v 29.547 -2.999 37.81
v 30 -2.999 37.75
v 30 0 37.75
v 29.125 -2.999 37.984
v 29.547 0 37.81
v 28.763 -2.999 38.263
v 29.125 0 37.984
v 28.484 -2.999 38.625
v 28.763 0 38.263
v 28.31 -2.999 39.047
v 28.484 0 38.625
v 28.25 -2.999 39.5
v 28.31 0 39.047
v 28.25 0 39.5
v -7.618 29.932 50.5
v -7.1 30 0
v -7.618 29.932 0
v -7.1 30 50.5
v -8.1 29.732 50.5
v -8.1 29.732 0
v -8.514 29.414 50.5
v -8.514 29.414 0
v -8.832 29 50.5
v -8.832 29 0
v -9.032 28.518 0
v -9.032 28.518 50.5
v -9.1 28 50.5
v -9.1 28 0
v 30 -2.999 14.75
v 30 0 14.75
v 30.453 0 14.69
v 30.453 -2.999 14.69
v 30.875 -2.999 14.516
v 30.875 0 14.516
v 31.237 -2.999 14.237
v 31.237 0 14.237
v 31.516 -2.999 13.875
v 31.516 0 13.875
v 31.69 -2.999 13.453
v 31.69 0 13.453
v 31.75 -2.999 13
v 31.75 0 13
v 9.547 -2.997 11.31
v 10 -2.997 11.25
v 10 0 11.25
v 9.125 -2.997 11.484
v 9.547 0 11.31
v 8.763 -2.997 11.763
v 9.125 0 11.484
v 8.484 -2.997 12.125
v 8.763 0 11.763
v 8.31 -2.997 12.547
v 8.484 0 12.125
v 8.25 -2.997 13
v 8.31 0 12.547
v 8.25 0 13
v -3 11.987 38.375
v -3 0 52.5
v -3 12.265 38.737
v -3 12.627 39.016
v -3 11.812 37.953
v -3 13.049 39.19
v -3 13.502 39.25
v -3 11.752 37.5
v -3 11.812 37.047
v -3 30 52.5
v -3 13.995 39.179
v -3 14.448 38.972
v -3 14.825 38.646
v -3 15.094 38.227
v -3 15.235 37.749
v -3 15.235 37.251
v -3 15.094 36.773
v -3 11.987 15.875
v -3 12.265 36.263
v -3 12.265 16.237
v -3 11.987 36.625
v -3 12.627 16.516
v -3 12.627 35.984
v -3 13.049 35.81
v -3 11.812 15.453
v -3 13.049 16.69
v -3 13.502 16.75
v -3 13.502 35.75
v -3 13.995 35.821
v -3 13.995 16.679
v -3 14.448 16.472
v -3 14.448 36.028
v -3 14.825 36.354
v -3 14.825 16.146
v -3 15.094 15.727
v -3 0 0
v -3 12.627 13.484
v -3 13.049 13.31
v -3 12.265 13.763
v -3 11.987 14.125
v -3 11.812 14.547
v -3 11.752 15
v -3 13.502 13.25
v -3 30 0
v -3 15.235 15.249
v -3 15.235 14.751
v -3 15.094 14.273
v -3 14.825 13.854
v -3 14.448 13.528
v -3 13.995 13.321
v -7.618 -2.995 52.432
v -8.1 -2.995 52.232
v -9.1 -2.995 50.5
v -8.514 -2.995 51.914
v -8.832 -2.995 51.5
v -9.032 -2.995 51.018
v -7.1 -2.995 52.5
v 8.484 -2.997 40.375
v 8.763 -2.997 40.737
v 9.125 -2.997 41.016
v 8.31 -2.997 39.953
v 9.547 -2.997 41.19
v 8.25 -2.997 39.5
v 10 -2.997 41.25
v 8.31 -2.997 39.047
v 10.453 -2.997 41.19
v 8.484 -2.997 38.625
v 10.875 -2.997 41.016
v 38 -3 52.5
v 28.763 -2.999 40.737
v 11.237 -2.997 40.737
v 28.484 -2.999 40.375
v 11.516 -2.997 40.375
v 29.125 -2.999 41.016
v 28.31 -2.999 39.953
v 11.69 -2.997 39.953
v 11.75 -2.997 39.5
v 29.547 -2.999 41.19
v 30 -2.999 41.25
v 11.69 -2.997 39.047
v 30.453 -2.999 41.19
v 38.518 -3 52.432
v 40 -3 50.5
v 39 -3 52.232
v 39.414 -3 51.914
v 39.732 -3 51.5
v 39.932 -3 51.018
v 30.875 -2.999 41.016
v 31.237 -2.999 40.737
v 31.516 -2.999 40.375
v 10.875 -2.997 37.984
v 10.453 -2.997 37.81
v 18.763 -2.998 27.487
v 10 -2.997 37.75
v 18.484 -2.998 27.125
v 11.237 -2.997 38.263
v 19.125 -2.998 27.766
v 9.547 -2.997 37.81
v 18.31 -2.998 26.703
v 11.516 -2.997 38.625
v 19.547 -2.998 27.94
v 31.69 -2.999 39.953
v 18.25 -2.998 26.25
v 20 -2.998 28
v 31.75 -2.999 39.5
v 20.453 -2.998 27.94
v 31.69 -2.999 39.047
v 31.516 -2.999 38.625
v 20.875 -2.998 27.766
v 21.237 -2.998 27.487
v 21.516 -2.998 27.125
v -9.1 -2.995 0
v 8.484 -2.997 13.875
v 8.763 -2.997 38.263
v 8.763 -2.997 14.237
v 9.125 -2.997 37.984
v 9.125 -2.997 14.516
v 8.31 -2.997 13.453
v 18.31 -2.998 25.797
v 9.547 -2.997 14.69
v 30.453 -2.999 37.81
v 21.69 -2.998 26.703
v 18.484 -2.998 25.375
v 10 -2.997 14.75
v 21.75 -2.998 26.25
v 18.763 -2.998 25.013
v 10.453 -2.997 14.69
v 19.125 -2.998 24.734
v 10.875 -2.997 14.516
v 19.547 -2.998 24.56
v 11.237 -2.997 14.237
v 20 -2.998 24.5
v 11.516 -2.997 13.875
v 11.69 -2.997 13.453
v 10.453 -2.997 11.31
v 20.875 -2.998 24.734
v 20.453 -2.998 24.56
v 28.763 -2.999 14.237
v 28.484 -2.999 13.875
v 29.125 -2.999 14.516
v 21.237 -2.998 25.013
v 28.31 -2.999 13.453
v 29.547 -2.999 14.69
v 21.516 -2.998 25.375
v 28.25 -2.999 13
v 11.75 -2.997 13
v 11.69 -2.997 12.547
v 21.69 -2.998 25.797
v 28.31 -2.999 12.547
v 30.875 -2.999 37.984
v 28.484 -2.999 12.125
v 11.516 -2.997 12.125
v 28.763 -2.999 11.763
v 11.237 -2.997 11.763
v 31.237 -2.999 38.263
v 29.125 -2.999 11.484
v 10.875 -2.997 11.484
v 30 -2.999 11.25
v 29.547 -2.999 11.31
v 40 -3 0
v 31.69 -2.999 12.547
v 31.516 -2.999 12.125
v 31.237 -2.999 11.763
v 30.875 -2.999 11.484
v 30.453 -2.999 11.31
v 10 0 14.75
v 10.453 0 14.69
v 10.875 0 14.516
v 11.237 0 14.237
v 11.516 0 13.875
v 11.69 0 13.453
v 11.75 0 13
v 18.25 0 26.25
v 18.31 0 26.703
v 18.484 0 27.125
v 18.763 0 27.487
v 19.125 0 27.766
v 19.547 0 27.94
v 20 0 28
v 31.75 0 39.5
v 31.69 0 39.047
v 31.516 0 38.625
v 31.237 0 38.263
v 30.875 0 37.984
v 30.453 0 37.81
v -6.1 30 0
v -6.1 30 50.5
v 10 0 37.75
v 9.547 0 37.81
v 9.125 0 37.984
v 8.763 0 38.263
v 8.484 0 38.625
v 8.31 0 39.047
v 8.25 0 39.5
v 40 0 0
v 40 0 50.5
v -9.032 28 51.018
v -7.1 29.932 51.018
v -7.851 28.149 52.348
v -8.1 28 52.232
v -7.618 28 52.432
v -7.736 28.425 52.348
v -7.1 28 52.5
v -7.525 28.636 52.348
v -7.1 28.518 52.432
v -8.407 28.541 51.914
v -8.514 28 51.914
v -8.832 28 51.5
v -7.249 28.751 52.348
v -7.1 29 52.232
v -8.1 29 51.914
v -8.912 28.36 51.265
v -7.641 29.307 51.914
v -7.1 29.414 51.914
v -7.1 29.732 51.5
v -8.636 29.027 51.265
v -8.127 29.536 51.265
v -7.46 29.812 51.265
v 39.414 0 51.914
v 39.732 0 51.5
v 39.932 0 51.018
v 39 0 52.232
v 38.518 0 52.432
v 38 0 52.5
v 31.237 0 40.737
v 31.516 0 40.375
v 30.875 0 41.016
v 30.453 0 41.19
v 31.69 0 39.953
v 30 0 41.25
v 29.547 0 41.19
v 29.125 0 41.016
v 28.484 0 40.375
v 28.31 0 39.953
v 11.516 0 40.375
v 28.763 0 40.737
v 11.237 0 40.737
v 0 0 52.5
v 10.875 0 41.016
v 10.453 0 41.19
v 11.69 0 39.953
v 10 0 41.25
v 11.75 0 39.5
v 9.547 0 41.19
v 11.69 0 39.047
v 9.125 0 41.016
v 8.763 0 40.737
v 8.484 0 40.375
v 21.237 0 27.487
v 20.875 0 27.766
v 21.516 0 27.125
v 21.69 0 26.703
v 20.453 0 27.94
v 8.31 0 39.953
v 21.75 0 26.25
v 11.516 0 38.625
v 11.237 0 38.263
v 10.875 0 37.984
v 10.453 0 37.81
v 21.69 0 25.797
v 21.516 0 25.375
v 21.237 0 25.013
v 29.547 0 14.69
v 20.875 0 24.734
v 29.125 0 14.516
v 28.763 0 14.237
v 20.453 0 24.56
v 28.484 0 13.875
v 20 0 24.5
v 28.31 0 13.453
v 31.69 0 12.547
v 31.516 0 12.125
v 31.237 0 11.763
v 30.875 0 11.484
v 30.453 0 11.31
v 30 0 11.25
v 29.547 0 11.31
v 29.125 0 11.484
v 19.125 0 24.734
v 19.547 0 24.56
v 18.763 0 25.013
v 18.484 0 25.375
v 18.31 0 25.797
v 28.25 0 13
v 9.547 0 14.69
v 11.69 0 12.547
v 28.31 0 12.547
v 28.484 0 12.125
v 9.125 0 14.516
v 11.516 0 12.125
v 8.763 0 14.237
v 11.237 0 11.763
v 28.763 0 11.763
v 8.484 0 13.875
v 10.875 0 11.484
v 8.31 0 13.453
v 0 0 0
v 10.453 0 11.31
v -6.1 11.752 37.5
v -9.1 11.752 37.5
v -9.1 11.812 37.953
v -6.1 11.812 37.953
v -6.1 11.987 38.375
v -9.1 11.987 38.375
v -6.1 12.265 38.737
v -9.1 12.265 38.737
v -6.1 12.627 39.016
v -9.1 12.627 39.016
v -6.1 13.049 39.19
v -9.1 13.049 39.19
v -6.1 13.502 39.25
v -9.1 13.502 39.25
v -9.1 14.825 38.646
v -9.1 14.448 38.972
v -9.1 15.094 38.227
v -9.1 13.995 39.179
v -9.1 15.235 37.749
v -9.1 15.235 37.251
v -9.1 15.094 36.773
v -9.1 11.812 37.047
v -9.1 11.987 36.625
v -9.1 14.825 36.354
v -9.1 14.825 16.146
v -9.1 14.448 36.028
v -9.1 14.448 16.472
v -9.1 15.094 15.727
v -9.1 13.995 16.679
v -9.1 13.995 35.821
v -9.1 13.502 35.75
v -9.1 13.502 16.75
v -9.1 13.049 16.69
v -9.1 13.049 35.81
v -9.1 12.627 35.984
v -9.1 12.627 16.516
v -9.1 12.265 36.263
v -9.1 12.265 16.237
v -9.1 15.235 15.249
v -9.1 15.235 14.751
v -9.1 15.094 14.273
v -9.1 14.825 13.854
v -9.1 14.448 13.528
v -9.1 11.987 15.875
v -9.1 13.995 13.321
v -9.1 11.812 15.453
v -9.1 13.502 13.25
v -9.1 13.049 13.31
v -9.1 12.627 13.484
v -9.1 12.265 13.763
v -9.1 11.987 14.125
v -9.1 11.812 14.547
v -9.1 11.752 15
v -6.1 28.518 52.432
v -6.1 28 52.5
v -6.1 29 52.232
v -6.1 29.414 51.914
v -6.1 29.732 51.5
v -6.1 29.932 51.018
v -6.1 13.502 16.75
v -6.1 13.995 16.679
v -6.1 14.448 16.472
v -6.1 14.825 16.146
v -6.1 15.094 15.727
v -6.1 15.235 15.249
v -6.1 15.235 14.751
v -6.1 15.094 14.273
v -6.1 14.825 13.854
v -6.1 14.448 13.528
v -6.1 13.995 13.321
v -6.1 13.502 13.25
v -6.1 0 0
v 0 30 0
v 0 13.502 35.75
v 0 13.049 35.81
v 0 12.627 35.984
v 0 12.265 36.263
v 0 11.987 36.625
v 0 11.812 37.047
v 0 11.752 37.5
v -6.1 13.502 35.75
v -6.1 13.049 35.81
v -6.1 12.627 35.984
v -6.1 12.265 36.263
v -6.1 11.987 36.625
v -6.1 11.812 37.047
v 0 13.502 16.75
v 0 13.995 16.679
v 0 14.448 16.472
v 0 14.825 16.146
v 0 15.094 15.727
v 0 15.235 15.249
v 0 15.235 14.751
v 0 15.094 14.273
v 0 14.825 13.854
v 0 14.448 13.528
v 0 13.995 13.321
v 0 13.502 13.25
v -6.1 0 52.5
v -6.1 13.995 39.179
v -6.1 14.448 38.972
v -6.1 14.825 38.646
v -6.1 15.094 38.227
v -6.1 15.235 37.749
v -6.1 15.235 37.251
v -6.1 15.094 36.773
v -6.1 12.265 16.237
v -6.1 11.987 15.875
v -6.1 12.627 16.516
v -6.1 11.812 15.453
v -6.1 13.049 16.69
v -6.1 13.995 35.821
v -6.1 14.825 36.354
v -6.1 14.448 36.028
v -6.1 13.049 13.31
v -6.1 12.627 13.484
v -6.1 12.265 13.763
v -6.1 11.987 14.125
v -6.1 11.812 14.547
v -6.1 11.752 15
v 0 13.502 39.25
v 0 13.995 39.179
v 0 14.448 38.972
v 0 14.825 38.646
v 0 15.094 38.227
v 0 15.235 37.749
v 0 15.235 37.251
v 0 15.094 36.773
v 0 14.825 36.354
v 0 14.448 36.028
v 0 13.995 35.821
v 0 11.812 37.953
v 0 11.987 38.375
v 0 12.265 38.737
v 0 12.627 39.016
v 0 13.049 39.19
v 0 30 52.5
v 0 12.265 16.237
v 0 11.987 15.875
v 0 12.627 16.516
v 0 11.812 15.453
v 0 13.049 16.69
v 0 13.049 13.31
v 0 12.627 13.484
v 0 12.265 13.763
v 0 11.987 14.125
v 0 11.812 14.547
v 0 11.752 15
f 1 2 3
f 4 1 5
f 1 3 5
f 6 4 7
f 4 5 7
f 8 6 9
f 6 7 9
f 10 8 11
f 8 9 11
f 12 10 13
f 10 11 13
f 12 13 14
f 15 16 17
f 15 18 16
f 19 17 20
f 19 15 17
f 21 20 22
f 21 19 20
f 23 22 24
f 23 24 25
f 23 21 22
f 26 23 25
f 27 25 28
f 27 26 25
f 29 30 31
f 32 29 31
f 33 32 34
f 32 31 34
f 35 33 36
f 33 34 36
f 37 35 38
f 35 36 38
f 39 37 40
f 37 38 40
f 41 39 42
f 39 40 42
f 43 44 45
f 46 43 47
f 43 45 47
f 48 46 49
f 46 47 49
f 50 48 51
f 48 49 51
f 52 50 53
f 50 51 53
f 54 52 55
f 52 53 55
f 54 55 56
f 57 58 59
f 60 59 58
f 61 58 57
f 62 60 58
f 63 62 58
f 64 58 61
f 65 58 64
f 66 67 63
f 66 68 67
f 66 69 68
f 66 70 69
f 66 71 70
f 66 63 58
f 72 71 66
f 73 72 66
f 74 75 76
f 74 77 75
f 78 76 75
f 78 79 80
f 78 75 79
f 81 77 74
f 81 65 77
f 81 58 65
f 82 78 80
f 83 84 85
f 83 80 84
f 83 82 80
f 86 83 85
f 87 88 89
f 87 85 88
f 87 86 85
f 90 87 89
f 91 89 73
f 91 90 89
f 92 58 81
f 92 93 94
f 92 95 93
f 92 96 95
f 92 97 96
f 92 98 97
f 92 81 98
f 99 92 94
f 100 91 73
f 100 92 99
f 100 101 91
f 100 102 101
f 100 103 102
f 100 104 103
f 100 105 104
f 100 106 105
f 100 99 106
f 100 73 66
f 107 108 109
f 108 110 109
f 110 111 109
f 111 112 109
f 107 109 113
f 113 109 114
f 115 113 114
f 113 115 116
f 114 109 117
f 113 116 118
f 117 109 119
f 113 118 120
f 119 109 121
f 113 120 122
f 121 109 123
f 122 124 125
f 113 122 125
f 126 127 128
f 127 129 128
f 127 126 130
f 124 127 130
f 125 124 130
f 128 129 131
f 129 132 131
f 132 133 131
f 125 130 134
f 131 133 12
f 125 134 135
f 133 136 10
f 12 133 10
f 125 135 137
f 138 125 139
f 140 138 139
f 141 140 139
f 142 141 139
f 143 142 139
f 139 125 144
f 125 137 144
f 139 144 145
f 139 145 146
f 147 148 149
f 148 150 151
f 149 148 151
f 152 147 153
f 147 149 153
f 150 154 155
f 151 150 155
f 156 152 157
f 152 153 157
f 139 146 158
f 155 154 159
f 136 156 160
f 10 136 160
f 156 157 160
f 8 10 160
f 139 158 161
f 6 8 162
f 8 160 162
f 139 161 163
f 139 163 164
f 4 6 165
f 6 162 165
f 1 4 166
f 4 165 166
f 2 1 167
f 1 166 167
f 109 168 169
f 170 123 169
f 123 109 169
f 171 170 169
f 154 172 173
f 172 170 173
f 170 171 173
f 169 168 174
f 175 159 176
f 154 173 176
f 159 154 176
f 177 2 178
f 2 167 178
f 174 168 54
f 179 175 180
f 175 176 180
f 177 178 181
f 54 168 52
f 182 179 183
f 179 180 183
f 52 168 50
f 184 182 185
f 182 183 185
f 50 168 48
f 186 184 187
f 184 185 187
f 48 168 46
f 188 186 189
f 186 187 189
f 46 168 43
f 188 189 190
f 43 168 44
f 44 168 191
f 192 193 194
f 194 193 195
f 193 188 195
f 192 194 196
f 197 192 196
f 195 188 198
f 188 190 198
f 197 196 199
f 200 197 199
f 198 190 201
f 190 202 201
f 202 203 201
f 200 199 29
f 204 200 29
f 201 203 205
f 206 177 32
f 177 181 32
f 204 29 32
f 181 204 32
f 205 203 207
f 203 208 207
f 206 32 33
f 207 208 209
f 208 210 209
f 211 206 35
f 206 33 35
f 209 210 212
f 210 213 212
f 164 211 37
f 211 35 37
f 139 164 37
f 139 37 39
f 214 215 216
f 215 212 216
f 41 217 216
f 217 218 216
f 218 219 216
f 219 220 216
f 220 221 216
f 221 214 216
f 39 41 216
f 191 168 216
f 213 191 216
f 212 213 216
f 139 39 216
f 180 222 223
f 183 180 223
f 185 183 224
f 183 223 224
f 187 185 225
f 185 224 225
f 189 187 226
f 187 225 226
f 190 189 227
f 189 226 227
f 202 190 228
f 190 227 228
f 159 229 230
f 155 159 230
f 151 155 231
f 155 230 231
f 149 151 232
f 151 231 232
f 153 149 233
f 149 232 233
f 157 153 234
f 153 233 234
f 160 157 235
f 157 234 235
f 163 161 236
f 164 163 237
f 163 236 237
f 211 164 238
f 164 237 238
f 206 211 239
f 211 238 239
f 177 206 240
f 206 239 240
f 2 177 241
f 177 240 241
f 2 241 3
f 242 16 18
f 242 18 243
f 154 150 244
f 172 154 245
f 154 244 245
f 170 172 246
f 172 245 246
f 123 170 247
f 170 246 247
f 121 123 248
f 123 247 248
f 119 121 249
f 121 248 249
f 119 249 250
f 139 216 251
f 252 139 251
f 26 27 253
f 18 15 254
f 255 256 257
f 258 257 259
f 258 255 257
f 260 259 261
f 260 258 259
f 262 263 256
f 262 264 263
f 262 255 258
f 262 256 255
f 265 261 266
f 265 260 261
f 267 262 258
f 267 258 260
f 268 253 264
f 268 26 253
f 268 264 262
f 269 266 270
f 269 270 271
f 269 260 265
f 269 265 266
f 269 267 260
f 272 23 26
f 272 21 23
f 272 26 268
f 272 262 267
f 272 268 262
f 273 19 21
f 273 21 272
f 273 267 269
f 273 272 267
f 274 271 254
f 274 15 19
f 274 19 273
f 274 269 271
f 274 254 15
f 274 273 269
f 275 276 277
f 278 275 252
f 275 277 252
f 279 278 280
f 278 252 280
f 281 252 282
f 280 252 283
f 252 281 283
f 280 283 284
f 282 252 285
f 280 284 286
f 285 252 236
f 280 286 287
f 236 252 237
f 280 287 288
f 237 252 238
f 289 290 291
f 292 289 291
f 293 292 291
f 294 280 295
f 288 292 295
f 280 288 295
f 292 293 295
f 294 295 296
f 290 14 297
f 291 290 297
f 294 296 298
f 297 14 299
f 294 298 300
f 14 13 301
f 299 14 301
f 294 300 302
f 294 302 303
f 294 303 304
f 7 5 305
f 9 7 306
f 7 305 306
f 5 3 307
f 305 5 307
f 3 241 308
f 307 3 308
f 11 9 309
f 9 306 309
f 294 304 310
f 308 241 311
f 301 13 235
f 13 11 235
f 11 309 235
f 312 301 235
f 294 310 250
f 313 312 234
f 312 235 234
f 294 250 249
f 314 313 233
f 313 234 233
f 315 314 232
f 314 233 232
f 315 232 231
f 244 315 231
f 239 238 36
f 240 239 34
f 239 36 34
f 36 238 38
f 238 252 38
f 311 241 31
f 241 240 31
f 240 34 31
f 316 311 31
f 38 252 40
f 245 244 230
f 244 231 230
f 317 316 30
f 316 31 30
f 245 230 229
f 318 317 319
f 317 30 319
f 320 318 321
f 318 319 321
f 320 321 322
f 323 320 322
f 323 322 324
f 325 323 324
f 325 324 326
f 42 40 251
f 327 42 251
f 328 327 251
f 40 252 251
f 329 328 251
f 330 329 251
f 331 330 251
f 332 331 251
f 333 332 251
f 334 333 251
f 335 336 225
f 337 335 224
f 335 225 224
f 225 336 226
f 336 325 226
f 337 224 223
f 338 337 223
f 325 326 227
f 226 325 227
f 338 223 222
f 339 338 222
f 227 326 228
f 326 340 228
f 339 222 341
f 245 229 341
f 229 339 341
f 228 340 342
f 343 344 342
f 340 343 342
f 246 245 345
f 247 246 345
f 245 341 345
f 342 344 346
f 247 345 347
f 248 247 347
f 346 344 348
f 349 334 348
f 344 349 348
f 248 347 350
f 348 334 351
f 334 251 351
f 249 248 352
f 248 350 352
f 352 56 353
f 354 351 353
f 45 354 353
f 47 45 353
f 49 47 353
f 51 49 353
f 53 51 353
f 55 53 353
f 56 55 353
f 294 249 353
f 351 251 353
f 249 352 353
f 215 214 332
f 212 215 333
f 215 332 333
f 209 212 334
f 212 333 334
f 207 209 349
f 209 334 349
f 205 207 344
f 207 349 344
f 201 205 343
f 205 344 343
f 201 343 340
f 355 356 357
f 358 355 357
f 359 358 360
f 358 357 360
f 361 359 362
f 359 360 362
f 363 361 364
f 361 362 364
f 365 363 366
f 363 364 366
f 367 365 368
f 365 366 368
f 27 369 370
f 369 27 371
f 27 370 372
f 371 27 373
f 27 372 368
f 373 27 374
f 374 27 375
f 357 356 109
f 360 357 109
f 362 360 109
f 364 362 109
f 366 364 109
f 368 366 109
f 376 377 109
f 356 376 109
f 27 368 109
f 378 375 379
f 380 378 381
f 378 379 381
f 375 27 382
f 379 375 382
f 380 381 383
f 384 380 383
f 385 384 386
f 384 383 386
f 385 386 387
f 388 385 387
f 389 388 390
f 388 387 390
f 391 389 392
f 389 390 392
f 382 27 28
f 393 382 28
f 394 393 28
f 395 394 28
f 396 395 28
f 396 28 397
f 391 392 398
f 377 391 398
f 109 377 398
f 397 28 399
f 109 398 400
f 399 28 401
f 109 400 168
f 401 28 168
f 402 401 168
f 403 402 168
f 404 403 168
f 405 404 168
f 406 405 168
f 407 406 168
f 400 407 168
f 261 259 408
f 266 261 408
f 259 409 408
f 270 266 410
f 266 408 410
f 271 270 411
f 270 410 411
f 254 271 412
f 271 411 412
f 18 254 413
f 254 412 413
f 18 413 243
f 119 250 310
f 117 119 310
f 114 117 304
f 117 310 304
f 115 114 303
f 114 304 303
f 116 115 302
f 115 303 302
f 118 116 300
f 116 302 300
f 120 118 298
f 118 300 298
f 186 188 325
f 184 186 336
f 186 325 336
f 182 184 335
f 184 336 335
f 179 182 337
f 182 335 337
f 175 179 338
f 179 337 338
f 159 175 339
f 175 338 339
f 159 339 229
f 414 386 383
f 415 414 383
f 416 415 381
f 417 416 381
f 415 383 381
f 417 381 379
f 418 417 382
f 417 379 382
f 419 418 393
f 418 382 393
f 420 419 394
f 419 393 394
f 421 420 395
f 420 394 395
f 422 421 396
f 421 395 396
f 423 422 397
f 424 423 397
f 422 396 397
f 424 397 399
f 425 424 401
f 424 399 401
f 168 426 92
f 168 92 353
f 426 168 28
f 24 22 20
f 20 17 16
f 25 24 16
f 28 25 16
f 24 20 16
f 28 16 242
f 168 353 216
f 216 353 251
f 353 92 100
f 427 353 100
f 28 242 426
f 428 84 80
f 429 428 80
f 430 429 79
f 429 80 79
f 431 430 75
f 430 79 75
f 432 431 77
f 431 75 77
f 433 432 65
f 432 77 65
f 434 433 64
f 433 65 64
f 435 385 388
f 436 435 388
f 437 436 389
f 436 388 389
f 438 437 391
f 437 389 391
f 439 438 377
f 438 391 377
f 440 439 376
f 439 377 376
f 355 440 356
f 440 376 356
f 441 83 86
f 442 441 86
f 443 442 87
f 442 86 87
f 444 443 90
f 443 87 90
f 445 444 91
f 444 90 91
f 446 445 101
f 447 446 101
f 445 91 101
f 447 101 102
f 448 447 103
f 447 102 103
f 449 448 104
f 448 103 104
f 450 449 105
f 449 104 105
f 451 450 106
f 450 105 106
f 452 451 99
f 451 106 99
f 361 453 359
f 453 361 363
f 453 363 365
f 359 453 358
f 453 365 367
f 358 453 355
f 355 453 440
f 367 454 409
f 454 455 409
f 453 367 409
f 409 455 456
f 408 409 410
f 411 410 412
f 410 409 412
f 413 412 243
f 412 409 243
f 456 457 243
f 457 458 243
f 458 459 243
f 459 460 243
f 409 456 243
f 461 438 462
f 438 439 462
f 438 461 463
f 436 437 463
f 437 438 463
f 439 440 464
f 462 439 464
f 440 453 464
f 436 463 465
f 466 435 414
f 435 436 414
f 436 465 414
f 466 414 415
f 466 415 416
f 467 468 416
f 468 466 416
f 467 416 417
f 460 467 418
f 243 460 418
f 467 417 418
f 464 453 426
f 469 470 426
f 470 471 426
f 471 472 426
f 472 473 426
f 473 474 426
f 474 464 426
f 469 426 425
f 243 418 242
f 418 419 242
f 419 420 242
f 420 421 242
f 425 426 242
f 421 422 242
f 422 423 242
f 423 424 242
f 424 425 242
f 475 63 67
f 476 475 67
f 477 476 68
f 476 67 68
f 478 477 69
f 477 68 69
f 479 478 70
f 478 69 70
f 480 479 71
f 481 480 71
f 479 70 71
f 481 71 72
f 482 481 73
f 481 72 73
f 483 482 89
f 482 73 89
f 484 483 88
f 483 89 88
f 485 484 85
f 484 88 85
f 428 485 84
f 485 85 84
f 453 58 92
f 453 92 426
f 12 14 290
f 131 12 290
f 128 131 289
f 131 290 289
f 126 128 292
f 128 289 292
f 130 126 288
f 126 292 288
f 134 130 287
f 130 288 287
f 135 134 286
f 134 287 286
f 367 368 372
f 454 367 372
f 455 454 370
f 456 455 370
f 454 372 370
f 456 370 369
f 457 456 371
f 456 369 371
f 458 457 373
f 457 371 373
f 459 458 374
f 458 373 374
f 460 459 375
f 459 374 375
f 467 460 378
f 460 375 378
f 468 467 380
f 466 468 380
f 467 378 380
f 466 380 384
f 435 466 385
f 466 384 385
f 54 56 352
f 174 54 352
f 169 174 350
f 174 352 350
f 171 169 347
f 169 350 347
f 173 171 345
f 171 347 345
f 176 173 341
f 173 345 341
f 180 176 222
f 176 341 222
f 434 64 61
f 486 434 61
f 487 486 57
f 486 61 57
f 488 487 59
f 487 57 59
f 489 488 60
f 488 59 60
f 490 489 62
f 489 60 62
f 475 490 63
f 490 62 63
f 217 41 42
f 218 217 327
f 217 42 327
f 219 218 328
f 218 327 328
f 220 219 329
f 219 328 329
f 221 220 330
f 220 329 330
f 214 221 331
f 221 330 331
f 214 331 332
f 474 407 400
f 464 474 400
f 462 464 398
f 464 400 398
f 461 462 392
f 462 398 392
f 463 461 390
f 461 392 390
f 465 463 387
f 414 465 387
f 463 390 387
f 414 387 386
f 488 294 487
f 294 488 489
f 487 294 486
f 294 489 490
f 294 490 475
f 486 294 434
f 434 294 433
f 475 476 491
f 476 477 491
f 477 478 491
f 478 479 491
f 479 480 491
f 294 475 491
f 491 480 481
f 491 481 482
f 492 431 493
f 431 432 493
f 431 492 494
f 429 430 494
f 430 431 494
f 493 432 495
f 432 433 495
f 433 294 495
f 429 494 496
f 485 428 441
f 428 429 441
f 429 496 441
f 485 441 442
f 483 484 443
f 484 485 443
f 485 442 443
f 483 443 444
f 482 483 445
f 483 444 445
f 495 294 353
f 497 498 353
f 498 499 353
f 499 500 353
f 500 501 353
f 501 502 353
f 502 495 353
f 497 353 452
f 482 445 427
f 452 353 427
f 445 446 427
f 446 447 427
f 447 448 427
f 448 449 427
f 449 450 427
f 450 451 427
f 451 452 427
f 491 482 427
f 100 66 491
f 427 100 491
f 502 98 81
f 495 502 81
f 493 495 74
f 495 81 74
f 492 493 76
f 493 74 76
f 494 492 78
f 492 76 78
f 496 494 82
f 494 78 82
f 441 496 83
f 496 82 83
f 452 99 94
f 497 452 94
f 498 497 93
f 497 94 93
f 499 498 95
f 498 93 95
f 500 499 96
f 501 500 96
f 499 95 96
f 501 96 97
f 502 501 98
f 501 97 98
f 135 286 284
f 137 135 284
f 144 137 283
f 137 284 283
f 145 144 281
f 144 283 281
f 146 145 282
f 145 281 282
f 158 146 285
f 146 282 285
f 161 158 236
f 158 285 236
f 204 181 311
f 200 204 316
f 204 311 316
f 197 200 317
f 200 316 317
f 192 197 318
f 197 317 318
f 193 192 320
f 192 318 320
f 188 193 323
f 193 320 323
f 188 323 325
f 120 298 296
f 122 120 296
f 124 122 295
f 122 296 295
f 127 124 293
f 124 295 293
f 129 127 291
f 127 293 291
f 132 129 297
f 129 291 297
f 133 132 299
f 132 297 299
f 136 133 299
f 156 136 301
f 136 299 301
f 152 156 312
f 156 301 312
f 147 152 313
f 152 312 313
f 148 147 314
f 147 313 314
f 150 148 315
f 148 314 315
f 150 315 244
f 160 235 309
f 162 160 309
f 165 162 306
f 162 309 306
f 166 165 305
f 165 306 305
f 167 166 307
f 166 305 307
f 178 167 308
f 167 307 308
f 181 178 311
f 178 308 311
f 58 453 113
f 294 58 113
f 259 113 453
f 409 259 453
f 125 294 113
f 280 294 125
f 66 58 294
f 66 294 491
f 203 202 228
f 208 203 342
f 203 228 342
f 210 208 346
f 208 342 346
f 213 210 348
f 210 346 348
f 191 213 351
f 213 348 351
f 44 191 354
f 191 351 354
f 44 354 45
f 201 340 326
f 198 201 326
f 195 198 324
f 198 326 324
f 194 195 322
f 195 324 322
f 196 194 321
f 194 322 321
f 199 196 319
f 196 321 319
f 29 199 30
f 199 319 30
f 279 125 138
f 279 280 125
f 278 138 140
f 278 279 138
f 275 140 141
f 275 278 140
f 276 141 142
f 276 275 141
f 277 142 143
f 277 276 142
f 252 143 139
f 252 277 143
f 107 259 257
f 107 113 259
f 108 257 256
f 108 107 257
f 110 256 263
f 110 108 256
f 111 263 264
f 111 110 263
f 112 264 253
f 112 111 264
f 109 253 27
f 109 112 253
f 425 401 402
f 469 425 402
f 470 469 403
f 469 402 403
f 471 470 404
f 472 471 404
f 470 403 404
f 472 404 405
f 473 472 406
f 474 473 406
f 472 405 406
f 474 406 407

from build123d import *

# Parameters (mm, degrees)
F0_W     = 3
F0_H     = 30
F1_DEPTH = 52.5
F3_DEPTH = 25
F5_DEPTH = 25
F6_R     = 2


with BuildPart() as f1:
    # F0 (on Top) → F1 (new body)
    with BuildSketch(Plane.XY):
        with Locations((-1.5, 15)):
            Rectangle(F0_W, F0_H)
        with Locations((-7.6, 15)):
            Rectangle(F0_W, F0_H)
        Polygon((40, 0), (0, 0), (-3, 0), (-6.1, 0), (-9.1, 0), (-9.1, -2.9952730983), (40, -3), align=None)
    extrude(amount=F1_DEPTH)

    # F2 (on face) → F3 (cut)
    with BuildSketch(Plane(origin=(-9.1, 0, 0), x_dir=(0, -1, 0), z_dir=(-1, 0, 0))):
        with BuildLine():
            Line((-13.5023634508, 37.5), (-13.5023634508, 39.25))
            ThreePointArc((-13.5023634508, 39.25), (-15.2523634508, 37.5), (-13.5023634508, 35.75))
            Line((-13.5023634508, 35.75), (-13.5023634508, 37.5))
        make_face()
        with BuildLine():
            ThreePointArc((-11.7523634508, 37.5), (-12.2649265837, 38.7374368671), (-13.5023634508, 39.25))
            Line((-13.5023634508, 39.25), (-13.5023634508, 37.5))
            Line((-13.5023634508, 37.5), (-13.5023634508, 35.75))
            ThreePointArc((-13.5023634508, 35.75), (-12.2649265837, 36.2625631329), (-11.7523634508, 37.5))
        make_face()
        with BuildLine():
            Line((-13.5023634508, 15), (-13.5023634508, 13.25))
            ThreePointArc((-13.5023634508, 13.25), (-12.2649265837, 13.7625631329), (-11.7523634508, 15))
            ThreePointArc((-11.7523634508, 15), (-12.2649265837, 16.2374368671), (-13.5023634508, 16.75))
            Line((-13.5023634508, 16.75), (-13.5023634508, 15))
        make_face()
        with BuildLine():
            ThreePointArc((-13.5023634508, 16.75), (-15.2523634508, 15), (-13.5023634508, 13.25))
            Line((-13.5023634508, 13.25), (-13.5023634508, 15))
            Line((-13.5023634508, 15), (-13.5023634508, 16.75))
        make_face()
    extrude(amount=-F3_DEPTH, mode=Mode.SUBTRACT)

    # F4 (on face) → F5 (cut)
    with BuildSketch(Plane(origin=(0, 0, 0), x_dir=(-1, 0, 0), z_dir=(0, 1, 0))):
        with BuildLine():
            ThreePointArc((-30, 37.75), (-28.7625631329, 38.2625631329), (-28.25, 39.5))
            Line((-28.25, 39.5), (-30, 39.5))
            Line((-30, 39.5), (-30, 37.75))
        make_face()
        with BuildLine():
            ThreePointArc((-28.25, 39.5), (-28.7625631329, 40.7374368671), (-30, 41.25))
            Line((-30, 41.25), (-30, 39.5))
            Line((-30, 39.5), (-28.25, 39.5))
        make_face()
        with BuildLine():
            Line((-30, 39.5), (-30, 41.25))
            ThreePointArc((-30, 41.25), (-31.2374368671, 40.7374368671), (-31.75, 39.5))
            Line((-31.75, 39.5), (-30, 39.5))
        make_face()
        with BuildLine():
            Line((-30, 37.75), (-30, 39.5))
            Line((-30, 39.5), (-31.75, 39.5))
            ThreePointArc((-31.75, 39.5), (-31.2374368671, 38.2625631329), (-30, 37.75))
        make_face()
        with BuildLine():
            Line((-10, 37.75), (-10, 39.5))
            Line((-10, 39.5), (-11.75, 39.5))
            ThreePointArc((-11.75, 39.5), (-11.2374368671, 38.2625631329), (-10, 37.75))
        make_face()
        with BuildLine():
            ThreePointArc((-10, 37.75), (-8.7625631329, 38.2625631329), (-8.25, 39.5))
            Line((-8.25, 39.5), (-10, 39.5))
            Line((-10, 39.5), (-10, 37.75))
        make_face()
        with BuildLine():
            ThreePointArc((-8.25, 39.5), (-8.7625631329, 40.7374368671), (-10, 41.25))
            Line((-10, 41.25), (-10, 39.5))
            Line((-10, 39.5), (-8.25, 39.5))
        make_face()
        with BuildLine():
            Line((-10, 39.5), (-10, 41.25))
            ThreePointArc((-10, 41.25), (-11.2374368671, 40.7374368671), (-11.75, 39.5))
            Line((-11.75, 39.5), (-10, 39.5))
        make_face()
        with BuildLine():
            Line((-10, 13), (-10, 14.75))
            ThreePointArc((-10, 14.75), (-11.2374368671, 14.2374368671), (-11.75, 13))
            Line((-11.75, 13), (-10, 13))
        make_face()
        with BuildLine():
            ThreePointArc((-8.25, 13), (-8.7625631329, 14.2374368671), (-10, 14.75))
            Line((-10, 14.75), (-10, 13))
            Line((-10, 13), (-8.25, 13))
        make_face()
        with BuildLine():
            ThreePointArc((-10, 11.25), (-8.7625631329, 11.7625631329), (-8.25, 13))
            Line((-8.25, 13), (-10, 13))
            Line((-10, 13), (-10, 11.25))
        make_face()
        with BuildLine():
            Line((-10, 11.25), (-10, 13))
            Line((-10, 13), (-11.75, 13))
            ThreePointArc((-11.75, 13), (-11.2374368671, 11.7625631329), (-10, 11.25))
        make_face()
        with BuildLine():
            ThreePointArc((-30, 11.25), (-28.7625631329, 11.7625631329), (-28.25, 13))
            Line((-28.25, 13), (-30, 13))
            Line((-30, 13), (-30, 11.25))
        make_face()
        with BuildLine():
            Line((-30, 13), (-31.75, 13))
            ThreePointArc((-31.75, 13), (-31.2374368671, 11.7625631329), (-30, 11.25))
            Line((-30, 11.25), (-30, 13))
        make_face()
        with BuildLine():
            Line((-30, 13), (-30, 14.75))
            ThreePointArc((-30, 14.75), (-31.2374368671, 14.2374368671), (-31.75, 13))
            Line((-31.75, 13), (-30, 13))
        make_face()
        with BuildLine():
            ThreePointArc((-28.25, 13), (-28.7625631329, 14.2374368671), (-30, 14.75))
            Line((-30, 14.75), (-30, 13))
            Line((-30, 13), (-28.25, 13))
        make_face()
        with BuildLine():
            Line((-20, 24.5), (-20, 26.25))
            Line((-20, 26.25), (-21.75, 26.25))
            ThreePointArc((-21.75, 26.25), (-21.2374368671, 25.0125631329), (-20, 24.5))
        make_face()
        with BuildLine():
            ThreePointArc((-20, 24.5), (-18.7625631329, 25.0125631329), (-18.25, 26.25))
            Line((-18.25, 26.25), (-20, 26.25))
            Line((-20, 26.25), (-20, 24.5))
        make_face()
        with BuildLine():
            ThreePointArc((-18.25, 26.25), (-18.7625631329, 27.4874368671), (-20, 28))
            Line((-20, 28), (-20, 26.25))
            Line((-20, 26.25), (-18.25, 26.25))
        make_face()
        with BuildLine():
            Line((-20, 26.25), (-20, 28))
            ThreePointArc((-20, 28), (-21.2374368671, 27.4874368671), (-21.75, 26.25))
            Line((-21.75, 26.25), (-20, 26.25))
        make_face()
    extrude(amount=-F5_DEPTH, mode=Mode.SUBTRACT)

    # F6
    f6_edges = [f1.edges().sort_by_distance(p)[0] for p in [
        (40, -1.5, 52.5),
        (-9.1, 30, 26.25),
        (-9.1, 13.502363, 52.5),
        (-7.6, 30, 52.5),
    ]]
    fillet(f6_edges, radius=F6_R)


solid = f1.part
